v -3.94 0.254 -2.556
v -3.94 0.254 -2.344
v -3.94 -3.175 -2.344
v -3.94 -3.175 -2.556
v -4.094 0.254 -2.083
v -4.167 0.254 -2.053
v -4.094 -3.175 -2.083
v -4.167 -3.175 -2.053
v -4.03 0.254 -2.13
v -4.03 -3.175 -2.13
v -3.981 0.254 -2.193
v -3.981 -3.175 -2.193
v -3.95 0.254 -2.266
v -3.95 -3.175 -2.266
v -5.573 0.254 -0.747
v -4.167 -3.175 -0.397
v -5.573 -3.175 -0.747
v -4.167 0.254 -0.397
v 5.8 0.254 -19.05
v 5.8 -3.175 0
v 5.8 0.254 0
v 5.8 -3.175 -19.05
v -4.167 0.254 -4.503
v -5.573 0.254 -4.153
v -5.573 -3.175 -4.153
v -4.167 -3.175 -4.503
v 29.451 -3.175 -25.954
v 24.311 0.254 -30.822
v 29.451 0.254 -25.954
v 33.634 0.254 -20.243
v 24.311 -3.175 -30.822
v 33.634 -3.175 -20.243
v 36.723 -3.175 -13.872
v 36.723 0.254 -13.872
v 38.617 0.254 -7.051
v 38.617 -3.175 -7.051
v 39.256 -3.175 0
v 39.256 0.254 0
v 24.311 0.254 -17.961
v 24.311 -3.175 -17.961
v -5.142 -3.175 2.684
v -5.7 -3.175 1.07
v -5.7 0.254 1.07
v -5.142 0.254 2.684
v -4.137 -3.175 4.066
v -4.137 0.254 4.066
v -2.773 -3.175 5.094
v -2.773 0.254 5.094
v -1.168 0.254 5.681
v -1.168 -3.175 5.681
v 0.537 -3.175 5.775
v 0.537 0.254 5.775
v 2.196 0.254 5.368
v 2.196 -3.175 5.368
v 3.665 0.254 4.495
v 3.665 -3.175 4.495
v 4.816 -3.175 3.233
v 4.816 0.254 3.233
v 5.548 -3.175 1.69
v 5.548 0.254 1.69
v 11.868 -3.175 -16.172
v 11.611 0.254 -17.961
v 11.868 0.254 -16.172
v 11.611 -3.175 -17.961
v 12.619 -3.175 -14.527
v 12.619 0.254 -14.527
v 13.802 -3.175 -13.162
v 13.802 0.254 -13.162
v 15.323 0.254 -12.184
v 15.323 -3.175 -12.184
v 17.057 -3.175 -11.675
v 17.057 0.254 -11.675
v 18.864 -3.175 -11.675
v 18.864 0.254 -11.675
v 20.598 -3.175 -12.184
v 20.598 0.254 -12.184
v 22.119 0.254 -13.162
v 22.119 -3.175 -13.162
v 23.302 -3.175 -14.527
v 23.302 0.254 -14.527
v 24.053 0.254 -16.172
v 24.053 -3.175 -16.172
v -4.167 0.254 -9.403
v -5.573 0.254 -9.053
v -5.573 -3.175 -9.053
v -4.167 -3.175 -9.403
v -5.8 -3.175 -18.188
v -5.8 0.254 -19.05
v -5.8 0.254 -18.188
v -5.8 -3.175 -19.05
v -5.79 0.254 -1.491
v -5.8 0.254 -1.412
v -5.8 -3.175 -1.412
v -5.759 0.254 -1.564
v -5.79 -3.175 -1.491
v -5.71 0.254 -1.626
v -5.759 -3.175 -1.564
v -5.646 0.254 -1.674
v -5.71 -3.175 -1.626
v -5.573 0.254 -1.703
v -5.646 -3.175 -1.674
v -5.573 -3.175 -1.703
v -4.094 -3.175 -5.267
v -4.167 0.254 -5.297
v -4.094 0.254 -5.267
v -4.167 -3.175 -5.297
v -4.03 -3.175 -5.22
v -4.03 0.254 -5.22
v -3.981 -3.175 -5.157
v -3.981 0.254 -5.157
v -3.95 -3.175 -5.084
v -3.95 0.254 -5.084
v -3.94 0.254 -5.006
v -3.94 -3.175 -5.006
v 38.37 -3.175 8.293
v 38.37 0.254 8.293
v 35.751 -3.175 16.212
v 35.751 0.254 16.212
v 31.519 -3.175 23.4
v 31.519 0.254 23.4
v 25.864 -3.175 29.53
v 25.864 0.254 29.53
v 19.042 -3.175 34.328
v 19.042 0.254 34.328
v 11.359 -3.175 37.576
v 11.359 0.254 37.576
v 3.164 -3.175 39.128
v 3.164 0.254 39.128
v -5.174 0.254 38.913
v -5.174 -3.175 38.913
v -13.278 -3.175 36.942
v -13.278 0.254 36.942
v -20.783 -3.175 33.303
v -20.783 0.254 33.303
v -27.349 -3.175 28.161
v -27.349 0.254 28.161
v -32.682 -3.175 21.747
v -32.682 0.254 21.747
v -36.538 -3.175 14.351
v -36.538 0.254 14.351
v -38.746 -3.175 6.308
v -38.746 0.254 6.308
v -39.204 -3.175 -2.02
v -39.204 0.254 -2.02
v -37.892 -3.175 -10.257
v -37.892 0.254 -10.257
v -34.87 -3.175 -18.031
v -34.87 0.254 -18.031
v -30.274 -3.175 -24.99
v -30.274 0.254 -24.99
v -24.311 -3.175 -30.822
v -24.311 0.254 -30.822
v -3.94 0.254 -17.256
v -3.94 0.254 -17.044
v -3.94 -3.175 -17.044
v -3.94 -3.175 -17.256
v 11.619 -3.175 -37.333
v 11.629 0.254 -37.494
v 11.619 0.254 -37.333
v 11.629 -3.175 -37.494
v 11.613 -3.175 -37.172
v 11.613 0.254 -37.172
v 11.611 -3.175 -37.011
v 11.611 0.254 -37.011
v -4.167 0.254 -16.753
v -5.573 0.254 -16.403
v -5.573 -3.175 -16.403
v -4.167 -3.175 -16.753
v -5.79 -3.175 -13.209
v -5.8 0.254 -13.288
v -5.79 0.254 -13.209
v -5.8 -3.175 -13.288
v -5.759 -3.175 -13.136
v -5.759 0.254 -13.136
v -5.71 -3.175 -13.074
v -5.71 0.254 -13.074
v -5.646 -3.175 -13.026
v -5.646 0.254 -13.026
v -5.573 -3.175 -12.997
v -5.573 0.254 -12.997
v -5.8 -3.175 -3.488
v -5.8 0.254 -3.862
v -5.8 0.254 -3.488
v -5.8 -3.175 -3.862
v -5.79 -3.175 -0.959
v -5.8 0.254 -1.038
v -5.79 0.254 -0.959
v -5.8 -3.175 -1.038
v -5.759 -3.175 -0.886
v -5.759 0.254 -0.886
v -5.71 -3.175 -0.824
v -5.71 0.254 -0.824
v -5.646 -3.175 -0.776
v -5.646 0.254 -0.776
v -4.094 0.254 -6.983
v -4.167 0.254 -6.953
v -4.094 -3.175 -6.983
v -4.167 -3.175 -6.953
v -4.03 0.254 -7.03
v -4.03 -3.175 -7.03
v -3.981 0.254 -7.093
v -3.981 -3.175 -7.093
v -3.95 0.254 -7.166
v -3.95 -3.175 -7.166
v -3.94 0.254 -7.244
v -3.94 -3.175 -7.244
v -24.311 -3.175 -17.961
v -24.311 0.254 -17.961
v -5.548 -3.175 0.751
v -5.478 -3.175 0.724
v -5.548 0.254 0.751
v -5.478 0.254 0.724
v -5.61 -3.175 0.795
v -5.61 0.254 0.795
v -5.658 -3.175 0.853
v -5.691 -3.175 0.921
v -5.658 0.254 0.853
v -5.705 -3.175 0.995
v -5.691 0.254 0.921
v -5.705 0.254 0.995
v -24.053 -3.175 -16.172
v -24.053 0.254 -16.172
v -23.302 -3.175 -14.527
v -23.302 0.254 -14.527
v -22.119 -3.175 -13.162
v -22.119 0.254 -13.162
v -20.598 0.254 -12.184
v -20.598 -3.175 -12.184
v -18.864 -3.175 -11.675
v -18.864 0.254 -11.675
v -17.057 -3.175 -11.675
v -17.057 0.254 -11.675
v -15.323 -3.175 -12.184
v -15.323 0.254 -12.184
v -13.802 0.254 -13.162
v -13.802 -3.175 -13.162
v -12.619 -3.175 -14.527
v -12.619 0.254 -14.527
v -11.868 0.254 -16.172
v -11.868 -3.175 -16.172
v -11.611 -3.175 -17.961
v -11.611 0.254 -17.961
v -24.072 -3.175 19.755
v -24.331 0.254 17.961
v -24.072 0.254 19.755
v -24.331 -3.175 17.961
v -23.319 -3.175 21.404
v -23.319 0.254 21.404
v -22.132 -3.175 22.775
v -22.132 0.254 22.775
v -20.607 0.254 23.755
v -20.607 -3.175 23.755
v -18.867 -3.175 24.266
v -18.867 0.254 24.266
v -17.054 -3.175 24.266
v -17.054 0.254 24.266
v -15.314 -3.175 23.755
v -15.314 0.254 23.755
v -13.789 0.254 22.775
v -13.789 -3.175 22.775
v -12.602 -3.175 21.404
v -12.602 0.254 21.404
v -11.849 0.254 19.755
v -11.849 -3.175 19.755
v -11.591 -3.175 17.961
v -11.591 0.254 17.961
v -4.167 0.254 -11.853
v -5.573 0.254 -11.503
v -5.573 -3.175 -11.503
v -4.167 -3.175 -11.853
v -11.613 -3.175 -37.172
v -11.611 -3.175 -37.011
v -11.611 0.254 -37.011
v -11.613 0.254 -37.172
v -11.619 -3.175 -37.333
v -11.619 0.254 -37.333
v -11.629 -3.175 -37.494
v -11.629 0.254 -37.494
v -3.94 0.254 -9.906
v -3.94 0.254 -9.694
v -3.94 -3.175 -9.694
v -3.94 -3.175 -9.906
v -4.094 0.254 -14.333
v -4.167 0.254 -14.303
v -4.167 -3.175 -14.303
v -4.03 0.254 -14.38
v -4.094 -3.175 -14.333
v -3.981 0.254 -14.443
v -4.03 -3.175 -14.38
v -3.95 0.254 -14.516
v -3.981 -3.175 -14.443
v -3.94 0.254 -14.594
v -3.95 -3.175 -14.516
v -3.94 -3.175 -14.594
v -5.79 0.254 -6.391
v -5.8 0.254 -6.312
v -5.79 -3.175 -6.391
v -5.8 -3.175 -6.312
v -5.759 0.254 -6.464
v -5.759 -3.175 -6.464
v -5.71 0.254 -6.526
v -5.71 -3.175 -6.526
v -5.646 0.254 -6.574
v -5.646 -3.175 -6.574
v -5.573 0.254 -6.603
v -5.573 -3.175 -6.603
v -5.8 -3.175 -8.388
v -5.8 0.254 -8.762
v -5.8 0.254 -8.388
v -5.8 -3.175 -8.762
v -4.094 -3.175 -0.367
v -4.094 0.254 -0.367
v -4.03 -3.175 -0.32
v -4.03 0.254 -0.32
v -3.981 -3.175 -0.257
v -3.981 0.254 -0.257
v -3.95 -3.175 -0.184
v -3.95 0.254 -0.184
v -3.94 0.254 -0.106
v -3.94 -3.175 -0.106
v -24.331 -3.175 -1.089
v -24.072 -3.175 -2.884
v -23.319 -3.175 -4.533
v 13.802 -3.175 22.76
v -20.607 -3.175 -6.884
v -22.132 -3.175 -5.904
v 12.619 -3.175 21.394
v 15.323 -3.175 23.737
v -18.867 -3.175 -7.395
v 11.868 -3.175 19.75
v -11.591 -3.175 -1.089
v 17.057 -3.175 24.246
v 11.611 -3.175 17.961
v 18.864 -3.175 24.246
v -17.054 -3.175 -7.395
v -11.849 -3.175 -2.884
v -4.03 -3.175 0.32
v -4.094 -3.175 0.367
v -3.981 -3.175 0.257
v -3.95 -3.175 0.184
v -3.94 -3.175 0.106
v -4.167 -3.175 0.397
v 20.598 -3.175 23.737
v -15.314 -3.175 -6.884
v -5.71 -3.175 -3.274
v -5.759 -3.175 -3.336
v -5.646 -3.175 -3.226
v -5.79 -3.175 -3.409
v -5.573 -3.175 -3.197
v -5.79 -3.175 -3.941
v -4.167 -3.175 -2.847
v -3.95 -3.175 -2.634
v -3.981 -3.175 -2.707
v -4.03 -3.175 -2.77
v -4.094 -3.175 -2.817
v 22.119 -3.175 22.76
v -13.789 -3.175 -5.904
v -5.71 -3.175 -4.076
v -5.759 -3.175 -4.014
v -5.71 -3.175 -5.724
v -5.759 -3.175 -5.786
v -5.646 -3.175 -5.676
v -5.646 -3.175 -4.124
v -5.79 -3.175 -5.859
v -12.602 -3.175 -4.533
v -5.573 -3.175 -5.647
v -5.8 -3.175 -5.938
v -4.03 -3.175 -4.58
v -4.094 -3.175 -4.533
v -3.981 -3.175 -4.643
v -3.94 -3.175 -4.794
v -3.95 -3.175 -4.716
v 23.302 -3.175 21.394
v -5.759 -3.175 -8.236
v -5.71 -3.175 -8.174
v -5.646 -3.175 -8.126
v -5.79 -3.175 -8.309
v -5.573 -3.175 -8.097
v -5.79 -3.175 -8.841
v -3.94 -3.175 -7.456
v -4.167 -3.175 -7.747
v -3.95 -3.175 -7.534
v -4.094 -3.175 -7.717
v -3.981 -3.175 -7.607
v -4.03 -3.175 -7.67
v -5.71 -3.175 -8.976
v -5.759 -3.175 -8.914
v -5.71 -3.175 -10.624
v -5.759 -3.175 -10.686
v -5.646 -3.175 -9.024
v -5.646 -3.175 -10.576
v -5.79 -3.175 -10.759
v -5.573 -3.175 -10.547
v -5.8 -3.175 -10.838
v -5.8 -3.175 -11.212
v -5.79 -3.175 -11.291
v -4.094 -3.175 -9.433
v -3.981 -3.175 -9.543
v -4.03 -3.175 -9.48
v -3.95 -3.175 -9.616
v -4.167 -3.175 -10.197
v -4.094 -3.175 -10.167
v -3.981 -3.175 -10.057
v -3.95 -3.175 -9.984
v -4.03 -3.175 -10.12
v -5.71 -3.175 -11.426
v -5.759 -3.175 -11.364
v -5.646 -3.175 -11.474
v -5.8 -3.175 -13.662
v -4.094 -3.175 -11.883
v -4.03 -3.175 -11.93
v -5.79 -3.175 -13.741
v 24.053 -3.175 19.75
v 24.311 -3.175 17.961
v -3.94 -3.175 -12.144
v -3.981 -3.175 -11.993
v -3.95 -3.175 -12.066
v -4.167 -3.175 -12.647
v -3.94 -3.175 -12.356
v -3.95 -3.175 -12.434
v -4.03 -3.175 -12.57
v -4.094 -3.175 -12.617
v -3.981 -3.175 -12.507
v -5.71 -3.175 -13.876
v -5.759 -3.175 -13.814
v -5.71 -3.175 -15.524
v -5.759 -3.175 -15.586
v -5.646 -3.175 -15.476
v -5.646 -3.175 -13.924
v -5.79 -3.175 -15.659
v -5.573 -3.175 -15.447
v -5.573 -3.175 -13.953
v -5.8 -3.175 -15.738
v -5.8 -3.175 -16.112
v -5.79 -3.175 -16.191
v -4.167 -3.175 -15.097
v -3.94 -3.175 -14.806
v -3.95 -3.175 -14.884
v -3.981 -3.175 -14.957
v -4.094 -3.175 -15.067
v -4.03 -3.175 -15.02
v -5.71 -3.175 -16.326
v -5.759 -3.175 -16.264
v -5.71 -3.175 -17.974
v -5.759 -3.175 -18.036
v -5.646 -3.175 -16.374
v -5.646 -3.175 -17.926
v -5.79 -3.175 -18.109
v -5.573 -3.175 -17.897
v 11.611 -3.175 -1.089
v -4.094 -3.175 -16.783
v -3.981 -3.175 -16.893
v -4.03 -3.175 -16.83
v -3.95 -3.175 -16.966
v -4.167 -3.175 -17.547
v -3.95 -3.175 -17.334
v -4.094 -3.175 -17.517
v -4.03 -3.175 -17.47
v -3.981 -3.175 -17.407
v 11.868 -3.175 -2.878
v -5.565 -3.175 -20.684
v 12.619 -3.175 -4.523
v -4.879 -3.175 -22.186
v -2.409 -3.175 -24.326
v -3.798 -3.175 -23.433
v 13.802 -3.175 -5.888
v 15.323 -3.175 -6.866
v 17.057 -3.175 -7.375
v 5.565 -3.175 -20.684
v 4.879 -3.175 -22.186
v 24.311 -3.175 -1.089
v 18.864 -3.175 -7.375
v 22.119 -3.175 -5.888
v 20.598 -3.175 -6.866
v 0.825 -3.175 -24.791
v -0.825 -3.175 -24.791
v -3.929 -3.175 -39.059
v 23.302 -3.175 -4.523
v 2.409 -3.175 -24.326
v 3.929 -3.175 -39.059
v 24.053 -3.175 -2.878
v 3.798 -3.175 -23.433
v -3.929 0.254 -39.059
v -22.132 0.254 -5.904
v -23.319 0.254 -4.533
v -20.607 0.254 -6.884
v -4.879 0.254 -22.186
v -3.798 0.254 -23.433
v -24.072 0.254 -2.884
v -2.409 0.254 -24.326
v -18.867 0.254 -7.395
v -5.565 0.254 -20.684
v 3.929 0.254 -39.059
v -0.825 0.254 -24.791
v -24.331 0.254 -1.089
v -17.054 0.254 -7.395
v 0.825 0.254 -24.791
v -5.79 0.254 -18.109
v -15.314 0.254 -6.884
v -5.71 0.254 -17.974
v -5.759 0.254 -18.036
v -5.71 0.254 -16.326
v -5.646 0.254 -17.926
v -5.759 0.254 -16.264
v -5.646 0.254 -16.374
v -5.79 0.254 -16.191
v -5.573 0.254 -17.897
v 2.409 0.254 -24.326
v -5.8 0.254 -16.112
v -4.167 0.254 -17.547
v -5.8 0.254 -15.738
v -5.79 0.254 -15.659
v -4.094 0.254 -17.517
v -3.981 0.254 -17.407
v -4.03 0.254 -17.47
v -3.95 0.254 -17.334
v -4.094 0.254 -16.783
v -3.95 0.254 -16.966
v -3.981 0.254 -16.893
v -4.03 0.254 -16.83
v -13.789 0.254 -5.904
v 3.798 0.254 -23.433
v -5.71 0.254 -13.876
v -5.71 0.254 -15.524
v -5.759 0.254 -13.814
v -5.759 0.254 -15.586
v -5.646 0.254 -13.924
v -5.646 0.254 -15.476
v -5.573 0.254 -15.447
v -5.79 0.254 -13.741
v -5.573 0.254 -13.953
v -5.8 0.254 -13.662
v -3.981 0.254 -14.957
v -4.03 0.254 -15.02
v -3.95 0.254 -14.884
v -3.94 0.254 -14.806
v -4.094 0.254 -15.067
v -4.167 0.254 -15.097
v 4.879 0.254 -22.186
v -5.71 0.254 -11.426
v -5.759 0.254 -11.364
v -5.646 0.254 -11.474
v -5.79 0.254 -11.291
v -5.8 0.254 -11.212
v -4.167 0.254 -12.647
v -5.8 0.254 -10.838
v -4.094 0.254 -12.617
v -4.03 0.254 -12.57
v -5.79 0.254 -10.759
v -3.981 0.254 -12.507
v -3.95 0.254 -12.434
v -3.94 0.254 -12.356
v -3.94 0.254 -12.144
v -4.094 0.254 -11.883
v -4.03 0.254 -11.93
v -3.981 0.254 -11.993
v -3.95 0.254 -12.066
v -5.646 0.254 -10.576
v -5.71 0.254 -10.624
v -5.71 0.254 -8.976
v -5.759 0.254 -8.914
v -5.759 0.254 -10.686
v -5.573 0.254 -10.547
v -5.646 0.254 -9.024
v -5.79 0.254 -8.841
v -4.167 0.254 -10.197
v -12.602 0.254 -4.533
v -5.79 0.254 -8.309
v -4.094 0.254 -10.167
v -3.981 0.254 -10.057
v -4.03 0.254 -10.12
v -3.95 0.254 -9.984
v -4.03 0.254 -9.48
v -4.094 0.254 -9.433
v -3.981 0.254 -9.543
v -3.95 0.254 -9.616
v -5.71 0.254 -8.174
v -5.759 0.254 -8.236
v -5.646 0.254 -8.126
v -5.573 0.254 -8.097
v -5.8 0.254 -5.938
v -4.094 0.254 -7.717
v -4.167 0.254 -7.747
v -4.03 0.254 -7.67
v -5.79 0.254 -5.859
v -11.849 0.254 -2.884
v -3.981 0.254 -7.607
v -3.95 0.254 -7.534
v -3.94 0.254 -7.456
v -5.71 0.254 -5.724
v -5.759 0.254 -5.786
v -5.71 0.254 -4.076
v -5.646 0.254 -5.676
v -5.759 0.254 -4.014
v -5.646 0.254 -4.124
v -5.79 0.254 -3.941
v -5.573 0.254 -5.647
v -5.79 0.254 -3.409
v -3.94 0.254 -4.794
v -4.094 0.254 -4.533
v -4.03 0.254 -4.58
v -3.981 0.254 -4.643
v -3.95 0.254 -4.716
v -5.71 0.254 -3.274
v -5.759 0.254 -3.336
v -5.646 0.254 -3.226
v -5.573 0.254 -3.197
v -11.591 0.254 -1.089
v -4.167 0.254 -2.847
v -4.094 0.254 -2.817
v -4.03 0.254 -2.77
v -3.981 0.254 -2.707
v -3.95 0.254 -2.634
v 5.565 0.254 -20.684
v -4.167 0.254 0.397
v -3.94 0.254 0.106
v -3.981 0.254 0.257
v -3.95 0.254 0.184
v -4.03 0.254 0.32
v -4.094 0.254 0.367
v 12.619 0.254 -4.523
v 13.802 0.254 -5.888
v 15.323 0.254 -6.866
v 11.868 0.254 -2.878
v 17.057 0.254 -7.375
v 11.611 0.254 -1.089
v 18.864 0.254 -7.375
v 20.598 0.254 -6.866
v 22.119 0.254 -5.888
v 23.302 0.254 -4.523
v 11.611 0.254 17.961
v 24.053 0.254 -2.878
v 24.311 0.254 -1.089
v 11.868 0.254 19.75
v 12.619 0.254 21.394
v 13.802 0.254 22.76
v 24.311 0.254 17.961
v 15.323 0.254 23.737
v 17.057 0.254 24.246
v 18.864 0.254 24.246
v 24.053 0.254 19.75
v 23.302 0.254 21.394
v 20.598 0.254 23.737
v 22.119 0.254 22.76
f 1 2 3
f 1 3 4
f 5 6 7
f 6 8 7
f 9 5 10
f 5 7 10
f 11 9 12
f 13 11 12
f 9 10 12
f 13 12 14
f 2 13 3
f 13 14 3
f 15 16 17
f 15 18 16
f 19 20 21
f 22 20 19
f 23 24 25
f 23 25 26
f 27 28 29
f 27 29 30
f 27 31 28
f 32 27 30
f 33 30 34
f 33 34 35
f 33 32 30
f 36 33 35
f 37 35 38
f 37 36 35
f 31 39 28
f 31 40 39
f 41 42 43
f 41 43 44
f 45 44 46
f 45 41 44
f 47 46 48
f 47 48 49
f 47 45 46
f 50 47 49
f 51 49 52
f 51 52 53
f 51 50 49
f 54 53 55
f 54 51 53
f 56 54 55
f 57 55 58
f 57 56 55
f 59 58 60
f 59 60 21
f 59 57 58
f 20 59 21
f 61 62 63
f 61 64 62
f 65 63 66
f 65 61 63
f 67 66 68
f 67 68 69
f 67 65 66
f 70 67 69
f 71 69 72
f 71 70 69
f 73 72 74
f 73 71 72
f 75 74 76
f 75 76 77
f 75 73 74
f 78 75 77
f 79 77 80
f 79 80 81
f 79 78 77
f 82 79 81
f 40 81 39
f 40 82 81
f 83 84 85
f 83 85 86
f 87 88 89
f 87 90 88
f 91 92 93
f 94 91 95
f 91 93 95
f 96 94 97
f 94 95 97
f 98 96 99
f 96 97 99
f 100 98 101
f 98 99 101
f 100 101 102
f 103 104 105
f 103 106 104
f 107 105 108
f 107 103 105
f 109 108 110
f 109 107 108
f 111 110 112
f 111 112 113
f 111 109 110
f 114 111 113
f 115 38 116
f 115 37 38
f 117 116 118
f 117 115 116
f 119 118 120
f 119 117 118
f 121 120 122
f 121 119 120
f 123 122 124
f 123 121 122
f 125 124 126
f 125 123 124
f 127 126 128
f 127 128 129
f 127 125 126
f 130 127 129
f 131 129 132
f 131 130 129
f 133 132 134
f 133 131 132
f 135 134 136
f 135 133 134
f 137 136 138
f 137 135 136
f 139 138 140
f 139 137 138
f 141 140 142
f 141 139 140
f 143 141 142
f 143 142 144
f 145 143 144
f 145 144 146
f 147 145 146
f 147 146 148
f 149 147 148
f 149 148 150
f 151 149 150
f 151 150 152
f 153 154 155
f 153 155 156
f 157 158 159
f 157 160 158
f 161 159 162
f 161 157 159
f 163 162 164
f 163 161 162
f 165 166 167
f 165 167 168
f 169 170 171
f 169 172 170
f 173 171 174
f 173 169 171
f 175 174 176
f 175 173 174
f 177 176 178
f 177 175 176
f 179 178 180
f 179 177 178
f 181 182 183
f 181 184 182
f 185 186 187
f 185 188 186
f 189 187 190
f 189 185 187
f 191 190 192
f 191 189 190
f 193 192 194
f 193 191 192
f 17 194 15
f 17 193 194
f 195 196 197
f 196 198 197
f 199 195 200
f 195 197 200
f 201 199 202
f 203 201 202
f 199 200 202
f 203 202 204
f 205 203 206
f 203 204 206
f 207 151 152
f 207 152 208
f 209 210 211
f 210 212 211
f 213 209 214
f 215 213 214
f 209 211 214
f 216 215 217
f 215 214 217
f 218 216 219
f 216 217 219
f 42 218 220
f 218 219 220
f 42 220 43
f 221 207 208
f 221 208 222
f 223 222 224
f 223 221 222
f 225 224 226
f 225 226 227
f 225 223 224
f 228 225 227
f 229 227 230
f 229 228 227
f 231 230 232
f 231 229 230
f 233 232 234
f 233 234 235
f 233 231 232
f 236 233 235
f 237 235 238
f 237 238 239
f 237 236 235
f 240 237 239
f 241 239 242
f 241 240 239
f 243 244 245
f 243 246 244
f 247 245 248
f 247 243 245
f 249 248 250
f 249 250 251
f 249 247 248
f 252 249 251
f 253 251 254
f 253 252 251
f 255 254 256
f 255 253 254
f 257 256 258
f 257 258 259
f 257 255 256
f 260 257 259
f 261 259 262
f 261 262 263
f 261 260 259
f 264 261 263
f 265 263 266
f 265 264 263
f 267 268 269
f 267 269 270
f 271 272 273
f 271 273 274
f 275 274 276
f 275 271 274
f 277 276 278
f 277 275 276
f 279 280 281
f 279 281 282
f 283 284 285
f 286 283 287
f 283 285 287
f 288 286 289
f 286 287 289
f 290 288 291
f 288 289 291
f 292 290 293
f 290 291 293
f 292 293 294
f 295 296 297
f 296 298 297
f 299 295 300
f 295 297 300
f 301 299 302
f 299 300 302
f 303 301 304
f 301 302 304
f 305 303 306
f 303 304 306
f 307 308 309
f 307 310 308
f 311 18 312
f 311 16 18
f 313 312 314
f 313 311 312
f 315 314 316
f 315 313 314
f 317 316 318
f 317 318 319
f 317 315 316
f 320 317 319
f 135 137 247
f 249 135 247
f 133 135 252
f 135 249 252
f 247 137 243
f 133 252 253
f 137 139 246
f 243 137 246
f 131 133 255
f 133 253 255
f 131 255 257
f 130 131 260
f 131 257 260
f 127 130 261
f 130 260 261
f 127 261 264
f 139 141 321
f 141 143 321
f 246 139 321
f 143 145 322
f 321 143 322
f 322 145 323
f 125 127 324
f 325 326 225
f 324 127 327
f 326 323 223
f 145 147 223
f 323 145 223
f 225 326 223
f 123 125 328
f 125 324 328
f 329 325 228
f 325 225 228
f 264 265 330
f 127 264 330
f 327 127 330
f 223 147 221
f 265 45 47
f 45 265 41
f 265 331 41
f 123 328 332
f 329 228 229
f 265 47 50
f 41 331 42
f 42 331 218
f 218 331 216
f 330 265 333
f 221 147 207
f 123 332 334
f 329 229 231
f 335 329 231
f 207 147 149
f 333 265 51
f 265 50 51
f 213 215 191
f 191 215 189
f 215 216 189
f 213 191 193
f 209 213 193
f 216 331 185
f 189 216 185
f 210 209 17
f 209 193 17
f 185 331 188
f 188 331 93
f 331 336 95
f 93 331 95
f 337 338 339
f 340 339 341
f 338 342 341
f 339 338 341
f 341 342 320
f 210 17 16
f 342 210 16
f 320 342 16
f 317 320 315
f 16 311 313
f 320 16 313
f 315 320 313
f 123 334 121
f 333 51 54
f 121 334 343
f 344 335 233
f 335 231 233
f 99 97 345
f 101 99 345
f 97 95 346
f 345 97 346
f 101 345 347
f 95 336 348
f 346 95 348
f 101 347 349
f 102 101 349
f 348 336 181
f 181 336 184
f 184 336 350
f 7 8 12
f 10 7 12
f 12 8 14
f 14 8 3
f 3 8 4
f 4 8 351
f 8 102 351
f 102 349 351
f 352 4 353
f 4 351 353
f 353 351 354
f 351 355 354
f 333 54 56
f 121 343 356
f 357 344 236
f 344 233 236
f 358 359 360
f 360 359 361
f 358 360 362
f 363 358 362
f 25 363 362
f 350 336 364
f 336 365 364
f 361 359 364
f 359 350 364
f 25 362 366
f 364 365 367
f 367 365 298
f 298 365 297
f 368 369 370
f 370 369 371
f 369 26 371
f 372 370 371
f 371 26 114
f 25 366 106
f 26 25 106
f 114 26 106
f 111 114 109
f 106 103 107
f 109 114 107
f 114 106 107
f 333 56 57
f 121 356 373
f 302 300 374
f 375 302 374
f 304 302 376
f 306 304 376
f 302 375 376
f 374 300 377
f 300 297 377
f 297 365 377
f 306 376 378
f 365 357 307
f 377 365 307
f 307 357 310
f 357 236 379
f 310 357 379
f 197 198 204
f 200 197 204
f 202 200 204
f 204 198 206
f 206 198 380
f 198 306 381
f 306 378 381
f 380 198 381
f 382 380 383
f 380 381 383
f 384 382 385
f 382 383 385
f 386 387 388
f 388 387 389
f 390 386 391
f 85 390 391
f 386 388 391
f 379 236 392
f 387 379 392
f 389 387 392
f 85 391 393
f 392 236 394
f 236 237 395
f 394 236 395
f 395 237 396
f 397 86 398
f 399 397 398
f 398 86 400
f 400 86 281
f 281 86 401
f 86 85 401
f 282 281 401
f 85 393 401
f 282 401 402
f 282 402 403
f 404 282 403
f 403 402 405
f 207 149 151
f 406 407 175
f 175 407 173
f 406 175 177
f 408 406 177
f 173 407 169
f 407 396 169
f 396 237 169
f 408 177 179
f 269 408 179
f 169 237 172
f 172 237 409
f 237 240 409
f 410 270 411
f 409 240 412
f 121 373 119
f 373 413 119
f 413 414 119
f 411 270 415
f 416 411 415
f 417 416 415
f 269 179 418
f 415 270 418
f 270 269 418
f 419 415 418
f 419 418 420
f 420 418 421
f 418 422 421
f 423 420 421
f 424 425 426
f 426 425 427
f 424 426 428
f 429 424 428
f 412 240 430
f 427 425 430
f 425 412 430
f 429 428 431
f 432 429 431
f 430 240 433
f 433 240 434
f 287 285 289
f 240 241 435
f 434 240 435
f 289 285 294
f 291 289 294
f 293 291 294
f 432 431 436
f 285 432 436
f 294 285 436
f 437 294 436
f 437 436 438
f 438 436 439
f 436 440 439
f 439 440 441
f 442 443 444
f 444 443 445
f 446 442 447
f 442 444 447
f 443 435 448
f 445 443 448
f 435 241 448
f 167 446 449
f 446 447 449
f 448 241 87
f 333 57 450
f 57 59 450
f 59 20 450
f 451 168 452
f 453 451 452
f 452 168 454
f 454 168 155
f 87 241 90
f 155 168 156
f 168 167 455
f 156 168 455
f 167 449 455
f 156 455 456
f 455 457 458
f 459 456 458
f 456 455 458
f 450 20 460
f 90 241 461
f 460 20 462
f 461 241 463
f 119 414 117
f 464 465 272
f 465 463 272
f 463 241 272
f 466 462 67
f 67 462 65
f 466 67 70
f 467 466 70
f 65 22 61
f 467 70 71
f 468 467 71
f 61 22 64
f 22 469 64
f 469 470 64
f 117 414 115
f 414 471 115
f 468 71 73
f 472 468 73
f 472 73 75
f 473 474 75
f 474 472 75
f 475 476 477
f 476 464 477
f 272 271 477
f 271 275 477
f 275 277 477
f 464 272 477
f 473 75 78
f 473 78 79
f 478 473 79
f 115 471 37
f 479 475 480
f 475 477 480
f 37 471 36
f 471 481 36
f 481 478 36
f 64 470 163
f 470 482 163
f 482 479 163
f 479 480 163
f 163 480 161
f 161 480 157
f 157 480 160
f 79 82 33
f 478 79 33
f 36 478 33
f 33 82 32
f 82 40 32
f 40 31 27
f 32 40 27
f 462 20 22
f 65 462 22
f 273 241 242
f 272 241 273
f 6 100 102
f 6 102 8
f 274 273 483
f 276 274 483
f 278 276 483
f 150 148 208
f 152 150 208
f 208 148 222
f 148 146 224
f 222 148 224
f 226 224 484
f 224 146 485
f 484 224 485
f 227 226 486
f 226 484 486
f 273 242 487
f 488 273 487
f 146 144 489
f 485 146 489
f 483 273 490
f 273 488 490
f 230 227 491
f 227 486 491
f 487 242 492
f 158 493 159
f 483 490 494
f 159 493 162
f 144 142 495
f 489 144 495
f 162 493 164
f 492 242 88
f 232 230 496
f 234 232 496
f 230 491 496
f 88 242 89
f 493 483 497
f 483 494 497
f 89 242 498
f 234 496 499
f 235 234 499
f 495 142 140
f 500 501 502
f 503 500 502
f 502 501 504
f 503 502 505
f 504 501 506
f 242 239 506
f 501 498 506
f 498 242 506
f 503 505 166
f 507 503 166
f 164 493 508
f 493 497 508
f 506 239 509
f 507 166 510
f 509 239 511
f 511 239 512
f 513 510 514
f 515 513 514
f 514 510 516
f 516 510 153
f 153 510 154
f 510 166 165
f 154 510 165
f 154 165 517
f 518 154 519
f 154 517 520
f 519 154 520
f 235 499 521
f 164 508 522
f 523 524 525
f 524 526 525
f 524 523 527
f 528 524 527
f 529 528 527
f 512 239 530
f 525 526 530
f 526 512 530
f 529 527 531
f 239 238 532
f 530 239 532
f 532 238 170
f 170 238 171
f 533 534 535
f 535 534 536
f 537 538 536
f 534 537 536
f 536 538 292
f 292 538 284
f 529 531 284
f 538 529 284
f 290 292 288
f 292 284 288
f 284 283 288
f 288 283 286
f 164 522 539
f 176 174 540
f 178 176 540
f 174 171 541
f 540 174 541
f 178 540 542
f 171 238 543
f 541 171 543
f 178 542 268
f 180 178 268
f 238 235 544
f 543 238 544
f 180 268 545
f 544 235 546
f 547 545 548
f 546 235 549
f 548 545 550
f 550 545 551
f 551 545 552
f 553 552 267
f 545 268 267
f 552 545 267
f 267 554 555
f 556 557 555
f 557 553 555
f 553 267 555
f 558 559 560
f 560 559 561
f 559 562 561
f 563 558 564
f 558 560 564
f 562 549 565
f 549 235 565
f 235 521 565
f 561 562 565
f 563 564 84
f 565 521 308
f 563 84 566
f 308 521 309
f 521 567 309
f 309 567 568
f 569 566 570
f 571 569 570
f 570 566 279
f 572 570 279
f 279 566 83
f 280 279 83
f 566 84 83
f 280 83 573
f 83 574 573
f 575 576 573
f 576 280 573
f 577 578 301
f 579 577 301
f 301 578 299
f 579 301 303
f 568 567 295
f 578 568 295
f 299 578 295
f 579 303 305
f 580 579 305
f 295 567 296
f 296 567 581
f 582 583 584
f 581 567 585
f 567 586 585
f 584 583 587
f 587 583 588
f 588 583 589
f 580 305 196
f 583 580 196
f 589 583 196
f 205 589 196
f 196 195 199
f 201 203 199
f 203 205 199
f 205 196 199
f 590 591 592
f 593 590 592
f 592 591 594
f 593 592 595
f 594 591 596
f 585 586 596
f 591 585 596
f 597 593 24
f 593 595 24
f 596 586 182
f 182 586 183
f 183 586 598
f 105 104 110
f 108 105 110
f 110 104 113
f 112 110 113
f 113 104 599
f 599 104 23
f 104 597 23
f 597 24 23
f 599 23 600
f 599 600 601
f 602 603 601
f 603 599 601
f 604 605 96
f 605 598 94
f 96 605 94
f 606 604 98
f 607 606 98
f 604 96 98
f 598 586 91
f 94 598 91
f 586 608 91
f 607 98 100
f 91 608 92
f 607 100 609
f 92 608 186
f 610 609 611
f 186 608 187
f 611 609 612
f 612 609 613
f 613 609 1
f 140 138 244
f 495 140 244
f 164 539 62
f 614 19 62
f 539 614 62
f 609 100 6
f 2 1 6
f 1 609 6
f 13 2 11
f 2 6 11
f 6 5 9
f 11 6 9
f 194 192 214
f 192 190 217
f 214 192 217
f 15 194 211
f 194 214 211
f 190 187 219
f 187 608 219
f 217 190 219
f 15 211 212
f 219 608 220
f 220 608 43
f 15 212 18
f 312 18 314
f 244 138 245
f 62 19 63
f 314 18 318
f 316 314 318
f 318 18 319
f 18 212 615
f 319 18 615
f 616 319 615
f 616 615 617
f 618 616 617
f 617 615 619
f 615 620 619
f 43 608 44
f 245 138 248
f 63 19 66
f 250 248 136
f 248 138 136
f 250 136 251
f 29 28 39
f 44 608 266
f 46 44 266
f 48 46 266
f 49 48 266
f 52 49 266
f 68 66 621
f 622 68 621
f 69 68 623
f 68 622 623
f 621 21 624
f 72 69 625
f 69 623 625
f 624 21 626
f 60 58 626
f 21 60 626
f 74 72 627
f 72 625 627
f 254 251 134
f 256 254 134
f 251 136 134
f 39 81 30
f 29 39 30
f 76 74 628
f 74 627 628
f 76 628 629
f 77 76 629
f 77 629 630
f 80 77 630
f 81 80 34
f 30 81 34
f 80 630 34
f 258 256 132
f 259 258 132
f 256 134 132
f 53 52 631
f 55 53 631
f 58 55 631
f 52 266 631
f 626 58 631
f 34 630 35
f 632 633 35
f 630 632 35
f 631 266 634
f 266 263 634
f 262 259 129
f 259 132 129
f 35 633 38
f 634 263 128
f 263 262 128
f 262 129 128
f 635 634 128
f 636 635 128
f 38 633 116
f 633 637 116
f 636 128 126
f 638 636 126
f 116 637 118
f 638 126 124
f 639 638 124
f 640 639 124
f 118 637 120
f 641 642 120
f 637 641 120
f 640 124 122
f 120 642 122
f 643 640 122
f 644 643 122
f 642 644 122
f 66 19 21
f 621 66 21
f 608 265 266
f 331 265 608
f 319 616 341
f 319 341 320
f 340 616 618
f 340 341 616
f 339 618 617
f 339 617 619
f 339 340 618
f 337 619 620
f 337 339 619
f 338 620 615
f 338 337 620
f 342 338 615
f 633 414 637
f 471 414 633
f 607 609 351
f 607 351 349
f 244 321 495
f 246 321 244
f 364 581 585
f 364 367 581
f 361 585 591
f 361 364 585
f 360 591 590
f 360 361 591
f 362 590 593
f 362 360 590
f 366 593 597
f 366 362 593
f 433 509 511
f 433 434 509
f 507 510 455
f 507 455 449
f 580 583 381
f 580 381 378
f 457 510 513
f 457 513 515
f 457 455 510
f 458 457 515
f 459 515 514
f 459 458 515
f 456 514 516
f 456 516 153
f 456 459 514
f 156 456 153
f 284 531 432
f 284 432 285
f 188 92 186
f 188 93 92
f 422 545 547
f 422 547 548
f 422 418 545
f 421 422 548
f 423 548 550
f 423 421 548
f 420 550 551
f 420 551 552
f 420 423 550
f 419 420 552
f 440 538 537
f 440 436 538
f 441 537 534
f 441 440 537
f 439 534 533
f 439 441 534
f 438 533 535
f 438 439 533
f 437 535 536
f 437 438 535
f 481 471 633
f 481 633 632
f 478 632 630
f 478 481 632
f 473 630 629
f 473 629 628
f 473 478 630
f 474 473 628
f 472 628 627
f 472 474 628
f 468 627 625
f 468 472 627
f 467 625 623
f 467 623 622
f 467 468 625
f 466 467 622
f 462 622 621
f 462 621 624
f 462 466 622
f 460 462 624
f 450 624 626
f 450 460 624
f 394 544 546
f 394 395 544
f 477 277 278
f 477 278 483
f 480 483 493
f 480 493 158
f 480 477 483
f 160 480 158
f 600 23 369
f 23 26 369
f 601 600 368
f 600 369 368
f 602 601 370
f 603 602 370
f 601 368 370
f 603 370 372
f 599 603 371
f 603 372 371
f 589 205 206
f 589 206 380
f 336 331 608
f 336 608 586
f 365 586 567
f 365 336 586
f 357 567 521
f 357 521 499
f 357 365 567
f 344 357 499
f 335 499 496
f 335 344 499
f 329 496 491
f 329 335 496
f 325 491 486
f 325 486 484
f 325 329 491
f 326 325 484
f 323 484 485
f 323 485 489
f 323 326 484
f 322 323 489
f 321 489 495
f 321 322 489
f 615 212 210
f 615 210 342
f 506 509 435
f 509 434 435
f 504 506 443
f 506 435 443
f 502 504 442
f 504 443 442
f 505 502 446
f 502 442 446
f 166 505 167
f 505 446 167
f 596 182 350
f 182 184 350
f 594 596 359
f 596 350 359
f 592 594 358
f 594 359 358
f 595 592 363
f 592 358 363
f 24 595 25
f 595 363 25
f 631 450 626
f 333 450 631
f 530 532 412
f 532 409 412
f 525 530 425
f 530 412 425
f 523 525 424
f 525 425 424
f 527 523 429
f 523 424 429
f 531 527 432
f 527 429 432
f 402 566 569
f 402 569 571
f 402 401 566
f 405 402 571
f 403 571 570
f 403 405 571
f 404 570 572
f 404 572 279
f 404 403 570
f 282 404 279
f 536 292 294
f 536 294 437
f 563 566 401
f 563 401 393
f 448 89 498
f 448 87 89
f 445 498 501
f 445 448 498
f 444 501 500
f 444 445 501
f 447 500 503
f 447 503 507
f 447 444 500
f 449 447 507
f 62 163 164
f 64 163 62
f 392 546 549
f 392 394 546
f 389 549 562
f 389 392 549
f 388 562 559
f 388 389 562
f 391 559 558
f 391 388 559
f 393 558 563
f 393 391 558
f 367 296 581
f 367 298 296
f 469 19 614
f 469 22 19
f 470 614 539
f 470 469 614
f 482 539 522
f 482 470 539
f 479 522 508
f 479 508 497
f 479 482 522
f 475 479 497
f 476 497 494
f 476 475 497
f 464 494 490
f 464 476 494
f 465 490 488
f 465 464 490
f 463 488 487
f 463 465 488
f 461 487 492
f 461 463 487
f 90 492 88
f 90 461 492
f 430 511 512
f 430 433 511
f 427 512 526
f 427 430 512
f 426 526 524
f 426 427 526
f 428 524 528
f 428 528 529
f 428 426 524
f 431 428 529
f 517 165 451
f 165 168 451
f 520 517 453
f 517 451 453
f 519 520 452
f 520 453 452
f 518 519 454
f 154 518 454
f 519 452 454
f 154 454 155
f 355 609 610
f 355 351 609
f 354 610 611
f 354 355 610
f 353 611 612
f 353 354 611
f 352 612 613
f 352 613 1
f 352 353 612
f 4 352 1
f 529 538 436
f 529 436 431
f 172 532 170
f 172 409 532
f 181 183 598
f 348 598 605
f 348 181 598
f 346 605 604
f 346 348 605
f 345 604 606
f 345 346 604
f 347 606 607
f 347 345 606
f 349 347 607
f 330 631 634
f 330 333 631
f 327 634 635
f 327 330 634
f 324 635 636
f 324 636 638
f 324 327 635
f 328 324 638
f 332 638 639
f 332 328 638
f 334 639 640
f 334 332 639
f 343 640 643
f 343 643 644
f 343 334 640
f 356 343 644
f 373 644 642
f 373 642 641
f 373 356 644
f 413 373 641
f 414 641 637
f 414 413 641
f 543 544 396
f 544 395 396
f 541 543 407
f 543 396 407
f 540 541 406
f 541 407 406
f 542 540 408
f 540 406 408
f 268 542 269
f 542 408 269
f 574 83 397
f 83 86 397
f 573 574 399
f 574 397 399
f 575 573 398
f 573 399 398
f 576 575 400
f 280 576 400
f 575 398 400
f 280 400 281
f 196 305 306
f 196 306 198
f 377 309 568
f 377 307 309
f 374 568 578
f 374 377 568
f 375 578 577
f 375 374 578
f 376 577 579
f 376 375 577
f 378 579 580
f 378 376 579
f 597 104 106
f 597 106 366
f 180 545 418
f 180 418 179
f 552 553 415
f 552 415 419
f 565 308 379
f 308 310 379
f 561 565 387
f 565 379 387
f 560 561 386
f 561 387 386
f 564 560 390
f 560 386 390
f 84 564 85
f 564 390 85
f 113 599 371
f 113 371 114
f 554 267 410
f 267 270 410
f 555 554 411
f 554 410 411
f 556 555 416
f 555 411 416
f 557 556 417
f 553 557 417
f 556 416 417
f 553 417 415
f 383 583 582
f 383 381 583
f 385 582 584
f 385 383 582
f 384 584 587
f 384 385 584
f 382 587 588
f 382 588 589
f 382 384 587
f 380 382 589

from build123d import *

# Parameters (mm, degrees)
BOSS_EXTRUDE1_DEPTH      = 3.175
BOSS_EXTRUDE1_DEPTH_BACK = 0.254
BOSS_EXTRUDE2_DEPTH      = 3.429
LPATTERN1_COUNT          = 8
LPATTERN1_PITCH          = 2.45
FILLET1_R                = 0.3


with BuildPart() as part:
    # Sketch3 → Boss-Extrude1 (new body, two sides)
    with BuildSketch(Plane.XZ) as boss_extrude1_sk:
        with BuildLine():
            ThreePointArc((39.2557, 0), (-17.127226966, 35.322345321), (-24.310512242, -30.822215641))
            Line((-24.310512242, -30.822215641), (-24.310512242, -17.960512242))
            ThreePointArc((-24.310512242, -17.960512242), (-17.960512242, -11.610512242), (-11.610512242, -17.960512242))
            Line((-11.610512242, -17.960512242), (-11.610512242, -37.010512242))
            ThreePointArc((-11.610512242, -37.010512242), (-11.615116608, -37.252285377), (-11.628923029, -37.493707894))
            ThreePointArc((-11.628923029, -37.493707894), (0, -39.2557), (11.628923029, -37.493707894))
            ThreePointArc((11.628923029, -37.493707894), (11.615116608, -37.252285377), (11.610512242, -37.010512242))
            Line((11.610512242, -37.010512242), (11.610512242, -17.960512242))
            ThreePointArc((11.610512242, -17.960512242), (17.960512242, -11.610512242), (24.310512242, -17.960512242))
            Line((24.310512242, -17.960512242), (24.310512242, -30.822215641))
            ThreePointArc((24.310512242, -30.822215641), (35.322345321, -17.127226966), (39.2557, 0))
        make_face()
        with BuildLine():
            ThreePointArc((-5.8, 0), (0, 5.8), (5.8, 0))
            Line((5.8, 0), (5.8, -19.05))
            ThreePointArc((5.8, -19.05), (0, -24.85), (-5.8, -19.05))
            Line((-5.8, -19.05), (-5.8, 0))
        make_face(mode=Mode.SUBTRACT)
        with BuildLine():
            ThreePointArc((-11.590512242, -1.089487758), (-17.960512242, -7.459487758), (-24.330512242, -1.089487758))
            Line((-24.330512242, -1.089487758), (-24.330512242, 17.960512242))
            ThreePointArc((-24.330512242, 17.960512242), (-17.960512242, 24.330512242), (-11.590512242, 17.960512242))
            Line((-11.590512242, 17.960512242), (-11.590512242, -1.089487758))
        make_face(mode=Mode.SUBTRACT)
        with BuildLine():
            ThreePointArc((24.310512242, -1.089487758), (17.960512242, -7.439487758), (11.610512242, -1.089487758))
            Line((11.610512242, -1.089487758), (11.610512242, 17.960512242))
            ThreePointArc((11.610512242, 17.960512242), (17.960512242, 24.310512242), (24.310512242, 17.960512242))
            Line((24.310512242, 17.960512242), (24.310512242, -1.089487758))
        make_face(mode=Mode.SUBTRACT)
    extrude(amount=BOSS_EXTRUDE1_DEPTH)
    extrude(boss_extrude1_sk.sketch, amount=-BOSS_EXTRUDE1_DEPTH_BACK)

    # Sketch4 → Boss-Extrude2 (add)
    with BuildSketch(Plane(origin=(0, 0.254, 0), x_dir=(1, 0, 0), z_dir=(0, 1, 0))):
        Polygon((-5.8, -0.803750085), (-3.94, -0.34), (-3.94, 0.34), (-5.8, 0.803750085), align=None)
    boss_extrude2 = extrude(amount=-BOSS_EXTRUDE2_DEPTH)

    # LPattern1: Boss-Extrude2 ×8
    with Locations(*[(0, 0, -i * LPATTERN1_PITCH) for i in range(1, LPATTERN1_COUNT)]):
        add(boss_extrude2)

    # Fillet1
    fillet1_edges = [part.edges().sort_by_distance(p)[0] for p in [
        (-3.94, -1.4605, 0.34),
        (-5.8, -1.4605, -0.803750085),
        (-3.94, -1.4605, -0.34),
        (-5.7459101, -1.4605, 0.790263959),
        (-5.8, -1.4605, -1.646249915),
        (-5.8, -1.4605, -3.253750085),
        (-3.94, -1.4605, -2.79),
        (-3.94, -1.4605, -2.11),
        (-5.8, -1.4605, -4.096249915),
        (-5.8, -1.4605, -5.703750085),
        (-3.94, -1.4605, -5.24),
        (-3.94, -1.4605, -4.56),
        (-5.8, -1.4605, -6.546249915),
        (-5.8, -1.4605, -8.153750085),
        (-3.94, -1.4605, -7.69),
        (-3.94, -1.4605, -7.01),
        (-5.8, -1.4605, -8.996249915),
        (-5.8, -1.4605, -10.603750085),
        (-3.94, -1.4605, -10.14),
        (-3.94, -1.4605, -9.46),
        (-5.8, -1.4605, -11.446249915),
        (-5.8, -1.4605, -13.053750085),
        (-3.94, -1.4605, -12.59),
        (-3.94, -1.4605, -11.91),
        (-5.8, -1.4605, -13.896249915),
        (-5.8, -1.4605, -15.503750085),
        (-3.94, -1.4605, -15.04),
        (-3.94, -1.4605, -14.36),
        (-5.8, -1.4605, -16.346249915),
        (-5.8, -1.4605, -17.953750085),
        (-3.94, -1.4605, -17.49),
        (-3.94, -1.4605, -16.81),
    ]]
    fillet(fillet1_edges, radius=FILLET1_R)


solid = part.part
